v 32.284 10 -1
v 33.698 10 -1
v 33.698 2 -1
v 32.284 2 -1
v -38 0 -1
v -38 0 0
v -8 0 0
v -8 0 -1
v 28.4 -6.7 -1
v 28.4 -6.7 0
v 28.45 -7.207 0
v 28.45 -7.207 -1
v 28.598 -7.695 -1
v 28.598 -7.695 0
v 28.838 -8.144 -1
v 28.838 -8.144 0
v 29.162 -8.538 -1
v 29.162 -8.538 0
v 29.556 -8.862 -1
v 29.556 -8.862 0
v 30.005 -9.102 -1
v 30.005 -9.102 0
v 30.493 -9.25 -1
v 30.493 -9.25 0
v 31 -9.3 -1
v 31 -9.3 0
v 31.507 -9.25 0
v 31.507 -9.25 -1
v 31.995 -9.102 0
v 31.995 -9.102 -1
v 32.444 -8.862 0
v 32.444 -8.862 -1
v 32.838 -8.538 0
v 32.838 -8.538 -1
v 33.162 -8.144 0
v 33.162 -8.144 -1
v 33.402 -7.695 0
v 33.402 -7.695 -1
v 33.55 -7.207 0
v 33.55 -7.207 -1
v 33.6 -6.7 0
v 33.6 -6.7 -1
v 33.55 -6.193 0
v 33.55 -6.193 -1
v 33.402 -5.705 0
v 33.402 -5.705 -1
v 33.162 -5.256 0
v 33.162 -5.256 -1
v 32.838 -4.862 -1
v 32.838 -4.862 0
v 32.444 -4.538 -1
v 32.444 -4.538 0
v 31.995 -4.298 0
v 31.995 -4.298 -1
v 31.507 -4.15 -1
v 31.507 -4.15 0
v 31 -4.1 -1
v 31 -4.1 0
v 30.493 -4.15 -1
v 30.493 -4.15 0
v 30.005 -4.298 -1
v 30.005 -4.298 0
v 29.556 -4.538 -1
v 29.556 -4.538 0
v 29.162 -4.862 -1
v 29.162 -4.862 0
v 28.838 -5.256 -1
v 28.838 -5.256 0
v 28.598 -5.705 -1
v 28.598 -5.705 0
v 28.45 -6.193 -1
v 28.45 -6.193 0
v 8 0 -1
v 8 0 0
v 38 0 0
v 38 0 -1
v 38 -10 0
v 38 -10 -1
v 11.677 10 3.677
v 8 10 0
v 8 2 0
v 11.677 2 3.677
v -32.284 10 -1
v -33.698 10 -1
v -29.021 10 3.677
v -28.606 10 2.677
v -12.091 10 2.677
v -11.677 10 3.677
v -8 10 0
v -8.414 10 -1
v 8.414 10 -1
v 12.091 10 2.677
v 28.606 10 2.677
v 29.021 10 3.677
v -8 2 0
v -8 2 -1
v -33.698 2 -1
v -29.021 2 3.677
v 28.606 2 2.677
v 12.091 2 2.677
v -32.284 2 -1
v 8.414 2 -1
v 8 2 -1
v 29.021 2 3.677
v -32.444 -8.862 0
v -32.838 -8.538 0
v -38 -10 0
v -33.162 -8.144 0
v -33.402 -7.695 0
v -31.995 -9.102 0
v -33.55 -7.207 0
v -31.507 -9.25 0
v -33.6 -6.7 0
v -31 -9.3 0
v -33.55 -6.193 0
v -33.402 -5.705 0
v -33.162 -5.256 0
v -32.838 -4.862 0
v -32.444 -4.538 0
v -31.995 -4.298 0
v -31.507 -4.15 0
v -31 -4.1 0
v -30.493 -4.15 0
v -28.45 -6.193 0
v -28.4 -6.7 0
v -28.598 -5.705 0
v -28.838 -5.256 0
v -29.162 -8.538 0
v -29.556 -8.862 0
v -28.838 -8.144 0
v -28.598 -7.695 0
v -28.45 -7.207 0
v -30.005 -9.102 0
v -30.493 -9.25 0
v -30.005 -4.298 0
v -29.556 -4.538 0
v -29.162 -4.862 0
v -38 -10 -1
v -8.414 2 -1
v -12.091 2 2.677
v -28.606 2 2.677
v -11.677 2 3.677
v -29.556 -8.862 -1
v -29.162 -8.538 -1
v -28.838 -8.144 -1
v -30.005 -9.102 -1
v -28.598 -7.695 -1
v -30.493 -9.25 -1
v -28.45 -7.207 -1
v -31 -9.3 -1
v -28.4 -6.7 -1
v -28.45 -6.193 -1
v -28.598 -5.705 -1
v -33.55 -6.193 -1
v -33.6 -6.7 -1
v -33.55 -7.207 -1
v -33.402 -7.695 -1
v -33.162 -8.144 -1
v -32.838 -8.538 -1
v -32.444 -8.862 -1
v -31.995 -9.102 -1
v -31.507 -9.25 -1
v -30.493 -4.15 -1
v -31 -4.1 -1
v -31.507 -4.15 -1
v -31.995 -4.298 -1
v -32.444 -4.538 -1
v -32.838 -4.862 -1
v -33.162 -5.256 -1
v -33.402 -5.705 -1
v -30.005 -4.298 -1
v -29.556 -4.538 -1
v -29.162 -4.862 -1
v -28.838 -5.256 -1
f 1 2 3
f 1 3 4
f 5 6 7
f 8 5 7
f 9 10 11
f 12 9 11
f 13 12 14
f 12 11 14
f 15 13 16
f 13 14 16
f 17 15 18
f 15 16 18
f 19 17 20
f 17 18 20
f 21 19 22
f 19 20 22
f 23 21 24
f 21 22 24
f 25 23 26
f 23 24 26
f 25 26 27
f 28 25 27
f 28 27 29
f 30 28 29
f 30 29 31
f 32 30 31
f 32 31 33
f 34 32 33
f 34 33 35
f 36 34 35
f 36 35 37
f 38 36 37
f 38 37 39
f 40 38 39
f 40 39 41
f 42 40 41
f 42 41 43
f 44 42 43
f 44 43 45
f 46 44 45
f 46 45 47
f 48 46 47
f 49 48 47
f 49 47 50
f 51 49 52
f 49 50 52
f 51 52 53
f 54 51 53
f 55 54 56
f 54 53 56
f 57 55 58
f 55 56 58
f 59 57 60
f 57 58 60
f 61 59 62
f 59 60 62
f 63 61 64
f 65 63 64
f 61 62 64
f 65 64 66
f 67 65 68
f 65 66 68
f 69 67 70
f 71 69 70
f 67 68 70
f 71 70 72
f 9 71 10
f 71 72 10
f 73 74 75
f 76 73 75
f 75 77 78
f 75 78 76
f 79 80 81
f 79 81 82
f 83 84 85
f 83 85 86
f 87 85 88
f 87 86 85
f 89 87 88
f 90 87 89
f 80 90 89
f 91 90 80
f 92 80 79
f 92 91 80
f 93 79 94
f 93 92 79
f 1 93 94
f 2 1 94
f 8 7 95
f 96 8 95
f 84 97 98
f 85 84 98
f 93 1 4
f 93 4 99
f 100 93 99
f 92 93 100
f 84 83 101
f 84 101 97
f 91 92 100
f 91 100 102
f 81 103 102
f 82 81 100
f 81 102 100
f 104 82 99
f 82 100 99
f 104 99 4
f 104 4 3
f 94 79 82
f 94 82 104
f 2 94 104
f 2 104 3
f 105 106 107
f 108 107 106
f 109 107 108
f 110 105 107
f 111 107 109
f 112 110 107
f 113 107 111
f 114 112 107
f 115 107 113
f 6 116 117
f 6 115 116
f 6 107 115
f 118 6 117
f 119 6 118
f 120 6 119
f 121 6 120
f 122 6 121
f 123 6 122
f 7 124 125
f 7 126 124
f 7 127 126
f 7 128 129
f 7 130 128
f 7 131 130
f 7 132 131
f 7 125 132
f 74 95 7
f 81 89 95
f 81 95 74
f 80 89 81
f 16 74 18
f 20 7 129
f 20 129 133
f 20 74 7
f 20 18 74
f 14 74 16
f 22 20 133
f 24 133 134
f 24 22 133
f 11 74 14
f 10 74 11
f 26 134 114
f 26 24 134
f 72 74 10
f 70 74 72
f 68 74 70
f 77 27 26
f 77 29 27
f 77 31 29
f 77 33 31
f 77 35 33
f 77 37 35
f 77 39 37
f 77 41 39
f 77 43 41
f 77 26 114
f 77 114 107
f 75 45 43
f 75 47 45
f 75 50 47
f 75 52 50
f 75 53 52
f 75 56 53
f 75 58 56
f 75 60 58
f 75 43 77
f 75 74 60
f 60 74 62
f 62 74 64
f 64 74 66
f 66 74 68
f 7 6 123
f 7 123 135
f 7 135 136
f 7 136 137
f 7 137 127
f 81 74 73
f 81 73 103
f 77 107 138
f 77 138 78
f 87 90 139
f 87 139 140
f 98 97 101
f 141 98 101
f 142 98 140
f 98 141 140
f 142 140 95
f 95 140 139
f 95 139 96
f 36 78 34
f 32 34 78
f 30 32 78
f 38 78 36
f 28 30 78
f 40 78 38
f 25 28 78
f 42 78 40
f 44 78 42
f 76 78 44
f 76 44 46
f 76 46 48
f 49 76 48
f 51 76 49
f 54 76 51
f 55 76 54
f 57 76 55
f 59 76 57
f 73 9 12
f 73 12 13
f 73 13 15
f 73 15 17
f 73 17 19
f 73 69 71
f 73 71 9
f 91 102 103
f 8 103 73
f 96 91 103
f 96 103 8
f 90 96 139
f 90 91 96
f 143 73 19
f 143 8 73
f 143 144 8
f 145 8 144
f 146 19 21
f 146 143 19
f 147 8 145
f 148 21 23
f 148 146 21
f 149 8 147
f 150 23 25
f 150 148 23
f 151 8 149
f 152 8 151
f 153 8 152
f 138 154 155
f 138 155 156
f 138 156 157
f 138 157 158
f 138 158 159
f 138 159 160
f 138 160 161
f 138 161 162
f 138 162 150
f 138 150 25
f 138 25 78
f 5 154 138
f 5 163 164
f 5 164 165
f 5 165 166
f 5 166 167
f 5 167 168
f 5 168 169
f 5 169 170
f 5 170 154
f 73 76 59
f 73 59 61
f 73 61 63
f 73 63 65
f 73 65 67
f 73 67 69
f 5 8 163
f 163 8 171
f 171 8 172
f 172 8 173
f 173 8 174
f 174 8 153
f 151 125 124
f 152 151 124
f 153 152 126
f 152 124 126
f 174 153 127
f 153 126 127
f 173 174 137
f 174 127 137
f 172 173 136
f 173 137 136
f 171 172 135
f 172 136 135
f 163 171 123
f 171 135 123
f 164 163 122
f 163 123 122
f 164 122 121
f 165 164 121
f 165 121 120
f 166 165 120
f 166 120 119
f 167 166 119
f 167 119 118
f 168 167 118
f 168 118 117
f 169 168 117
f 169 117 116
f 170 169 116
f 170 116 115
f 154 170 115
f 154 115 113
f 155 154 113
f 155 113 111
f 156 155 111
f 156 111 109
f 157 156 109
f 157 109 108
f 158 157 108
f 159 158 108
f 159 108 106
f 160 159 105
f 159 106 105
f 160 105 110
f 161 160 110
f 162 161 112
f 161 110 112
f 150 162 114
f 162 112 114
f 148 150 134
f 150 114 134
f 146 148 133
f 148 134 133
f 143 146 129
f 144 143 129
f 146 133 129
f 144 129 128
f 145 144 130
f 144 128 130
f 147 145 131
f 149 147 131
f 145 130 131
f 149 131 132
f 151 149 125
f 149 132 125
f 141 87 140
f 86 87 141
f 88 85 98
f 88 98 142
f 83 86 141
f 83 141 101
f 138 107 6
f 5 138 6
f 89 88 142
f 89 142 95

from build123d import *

# Parameters (mm, degrees)
SKETCH1_W           = 76
SKETCH1_H           = 20
BASE_FLANGE1_DEPTH  = 1
SKETCH6_R           = 2.6
CUT_EXTRUDE1_DEPTH  = 10
SKETCH7_W           = 30
SKETCH7_H           = 10
CUT_EXTRUDE2_DEPTH  = 10
BOSS_EXTRUDE1_DEPTH = 8


# Sheet-metal steps are written as plain solids
with BuildPart() as part:
    # Sketch1 → Base-Flange1 (new body)
    with BuildSketch(Plane.XY):
        Rectangle(SKETCH1_W, SKETCH1_H)
    extrude(amount=-BASE_FLANGE1_DEPTH)

    # Sketch6 → Cut-Extrude1 (cut)
    with BuildSketch(Plane.XY):
        with Locations((-31, -6.7)):
            Circle(SKETCH6_R)
        with Locations(Location((31, -6.7, 0), (0, 0, 180))):
            Circle(SKETCH6_R)
    extrude(amount=-CUT_EXTRUDE1_DEPTH, mode=Mode.SUBTRACT)

    # Sketch7 → Cut-Extrude2 (cut)
    with BuildSketch(Plane.XY):
        with Locations((-23, 5)):
            Rectangle(SKETCH7_W, SKETCH7_H)
        with Locations((23, 5)):
            Rectangle(SKETCH7_W, SKETCH7_H)
    extrude(amount=-CUT_EXTRUDE2_DEPTH, mode=Mode.SUBTRACT)

    # Sketch8 → Boss-Extrude1 (add)
    with BuildSketch(Plane(origin=(0, 10, 0), x_dir=(1, 0, 0), z_dir=(0, 1, 0))):
        Polygon((8, 0), (11.67711212, -3.67711212), (29.020618382, -3.67711212), (33.697730502, 1), (32.28351694, 1), (28.60640482, -2.67711212), (12.091325682, -2.67711212), (8.414213562, 1), (8, 1), align=None)
        Polygon((-32.28351694, 1), (-33.697730502, 1), (-29.020618382, -3.67711212), (-11.67711212, -3.67711212), (-8, 0), (-8, 1), (-8.414213562, 1), (-12.091325682, -2.67711212), (-28.60640482, -2.67711212), align=None)
    extrude(amount=-BOSS_EXTRUDE1_DEPTH)


solid = part.part
